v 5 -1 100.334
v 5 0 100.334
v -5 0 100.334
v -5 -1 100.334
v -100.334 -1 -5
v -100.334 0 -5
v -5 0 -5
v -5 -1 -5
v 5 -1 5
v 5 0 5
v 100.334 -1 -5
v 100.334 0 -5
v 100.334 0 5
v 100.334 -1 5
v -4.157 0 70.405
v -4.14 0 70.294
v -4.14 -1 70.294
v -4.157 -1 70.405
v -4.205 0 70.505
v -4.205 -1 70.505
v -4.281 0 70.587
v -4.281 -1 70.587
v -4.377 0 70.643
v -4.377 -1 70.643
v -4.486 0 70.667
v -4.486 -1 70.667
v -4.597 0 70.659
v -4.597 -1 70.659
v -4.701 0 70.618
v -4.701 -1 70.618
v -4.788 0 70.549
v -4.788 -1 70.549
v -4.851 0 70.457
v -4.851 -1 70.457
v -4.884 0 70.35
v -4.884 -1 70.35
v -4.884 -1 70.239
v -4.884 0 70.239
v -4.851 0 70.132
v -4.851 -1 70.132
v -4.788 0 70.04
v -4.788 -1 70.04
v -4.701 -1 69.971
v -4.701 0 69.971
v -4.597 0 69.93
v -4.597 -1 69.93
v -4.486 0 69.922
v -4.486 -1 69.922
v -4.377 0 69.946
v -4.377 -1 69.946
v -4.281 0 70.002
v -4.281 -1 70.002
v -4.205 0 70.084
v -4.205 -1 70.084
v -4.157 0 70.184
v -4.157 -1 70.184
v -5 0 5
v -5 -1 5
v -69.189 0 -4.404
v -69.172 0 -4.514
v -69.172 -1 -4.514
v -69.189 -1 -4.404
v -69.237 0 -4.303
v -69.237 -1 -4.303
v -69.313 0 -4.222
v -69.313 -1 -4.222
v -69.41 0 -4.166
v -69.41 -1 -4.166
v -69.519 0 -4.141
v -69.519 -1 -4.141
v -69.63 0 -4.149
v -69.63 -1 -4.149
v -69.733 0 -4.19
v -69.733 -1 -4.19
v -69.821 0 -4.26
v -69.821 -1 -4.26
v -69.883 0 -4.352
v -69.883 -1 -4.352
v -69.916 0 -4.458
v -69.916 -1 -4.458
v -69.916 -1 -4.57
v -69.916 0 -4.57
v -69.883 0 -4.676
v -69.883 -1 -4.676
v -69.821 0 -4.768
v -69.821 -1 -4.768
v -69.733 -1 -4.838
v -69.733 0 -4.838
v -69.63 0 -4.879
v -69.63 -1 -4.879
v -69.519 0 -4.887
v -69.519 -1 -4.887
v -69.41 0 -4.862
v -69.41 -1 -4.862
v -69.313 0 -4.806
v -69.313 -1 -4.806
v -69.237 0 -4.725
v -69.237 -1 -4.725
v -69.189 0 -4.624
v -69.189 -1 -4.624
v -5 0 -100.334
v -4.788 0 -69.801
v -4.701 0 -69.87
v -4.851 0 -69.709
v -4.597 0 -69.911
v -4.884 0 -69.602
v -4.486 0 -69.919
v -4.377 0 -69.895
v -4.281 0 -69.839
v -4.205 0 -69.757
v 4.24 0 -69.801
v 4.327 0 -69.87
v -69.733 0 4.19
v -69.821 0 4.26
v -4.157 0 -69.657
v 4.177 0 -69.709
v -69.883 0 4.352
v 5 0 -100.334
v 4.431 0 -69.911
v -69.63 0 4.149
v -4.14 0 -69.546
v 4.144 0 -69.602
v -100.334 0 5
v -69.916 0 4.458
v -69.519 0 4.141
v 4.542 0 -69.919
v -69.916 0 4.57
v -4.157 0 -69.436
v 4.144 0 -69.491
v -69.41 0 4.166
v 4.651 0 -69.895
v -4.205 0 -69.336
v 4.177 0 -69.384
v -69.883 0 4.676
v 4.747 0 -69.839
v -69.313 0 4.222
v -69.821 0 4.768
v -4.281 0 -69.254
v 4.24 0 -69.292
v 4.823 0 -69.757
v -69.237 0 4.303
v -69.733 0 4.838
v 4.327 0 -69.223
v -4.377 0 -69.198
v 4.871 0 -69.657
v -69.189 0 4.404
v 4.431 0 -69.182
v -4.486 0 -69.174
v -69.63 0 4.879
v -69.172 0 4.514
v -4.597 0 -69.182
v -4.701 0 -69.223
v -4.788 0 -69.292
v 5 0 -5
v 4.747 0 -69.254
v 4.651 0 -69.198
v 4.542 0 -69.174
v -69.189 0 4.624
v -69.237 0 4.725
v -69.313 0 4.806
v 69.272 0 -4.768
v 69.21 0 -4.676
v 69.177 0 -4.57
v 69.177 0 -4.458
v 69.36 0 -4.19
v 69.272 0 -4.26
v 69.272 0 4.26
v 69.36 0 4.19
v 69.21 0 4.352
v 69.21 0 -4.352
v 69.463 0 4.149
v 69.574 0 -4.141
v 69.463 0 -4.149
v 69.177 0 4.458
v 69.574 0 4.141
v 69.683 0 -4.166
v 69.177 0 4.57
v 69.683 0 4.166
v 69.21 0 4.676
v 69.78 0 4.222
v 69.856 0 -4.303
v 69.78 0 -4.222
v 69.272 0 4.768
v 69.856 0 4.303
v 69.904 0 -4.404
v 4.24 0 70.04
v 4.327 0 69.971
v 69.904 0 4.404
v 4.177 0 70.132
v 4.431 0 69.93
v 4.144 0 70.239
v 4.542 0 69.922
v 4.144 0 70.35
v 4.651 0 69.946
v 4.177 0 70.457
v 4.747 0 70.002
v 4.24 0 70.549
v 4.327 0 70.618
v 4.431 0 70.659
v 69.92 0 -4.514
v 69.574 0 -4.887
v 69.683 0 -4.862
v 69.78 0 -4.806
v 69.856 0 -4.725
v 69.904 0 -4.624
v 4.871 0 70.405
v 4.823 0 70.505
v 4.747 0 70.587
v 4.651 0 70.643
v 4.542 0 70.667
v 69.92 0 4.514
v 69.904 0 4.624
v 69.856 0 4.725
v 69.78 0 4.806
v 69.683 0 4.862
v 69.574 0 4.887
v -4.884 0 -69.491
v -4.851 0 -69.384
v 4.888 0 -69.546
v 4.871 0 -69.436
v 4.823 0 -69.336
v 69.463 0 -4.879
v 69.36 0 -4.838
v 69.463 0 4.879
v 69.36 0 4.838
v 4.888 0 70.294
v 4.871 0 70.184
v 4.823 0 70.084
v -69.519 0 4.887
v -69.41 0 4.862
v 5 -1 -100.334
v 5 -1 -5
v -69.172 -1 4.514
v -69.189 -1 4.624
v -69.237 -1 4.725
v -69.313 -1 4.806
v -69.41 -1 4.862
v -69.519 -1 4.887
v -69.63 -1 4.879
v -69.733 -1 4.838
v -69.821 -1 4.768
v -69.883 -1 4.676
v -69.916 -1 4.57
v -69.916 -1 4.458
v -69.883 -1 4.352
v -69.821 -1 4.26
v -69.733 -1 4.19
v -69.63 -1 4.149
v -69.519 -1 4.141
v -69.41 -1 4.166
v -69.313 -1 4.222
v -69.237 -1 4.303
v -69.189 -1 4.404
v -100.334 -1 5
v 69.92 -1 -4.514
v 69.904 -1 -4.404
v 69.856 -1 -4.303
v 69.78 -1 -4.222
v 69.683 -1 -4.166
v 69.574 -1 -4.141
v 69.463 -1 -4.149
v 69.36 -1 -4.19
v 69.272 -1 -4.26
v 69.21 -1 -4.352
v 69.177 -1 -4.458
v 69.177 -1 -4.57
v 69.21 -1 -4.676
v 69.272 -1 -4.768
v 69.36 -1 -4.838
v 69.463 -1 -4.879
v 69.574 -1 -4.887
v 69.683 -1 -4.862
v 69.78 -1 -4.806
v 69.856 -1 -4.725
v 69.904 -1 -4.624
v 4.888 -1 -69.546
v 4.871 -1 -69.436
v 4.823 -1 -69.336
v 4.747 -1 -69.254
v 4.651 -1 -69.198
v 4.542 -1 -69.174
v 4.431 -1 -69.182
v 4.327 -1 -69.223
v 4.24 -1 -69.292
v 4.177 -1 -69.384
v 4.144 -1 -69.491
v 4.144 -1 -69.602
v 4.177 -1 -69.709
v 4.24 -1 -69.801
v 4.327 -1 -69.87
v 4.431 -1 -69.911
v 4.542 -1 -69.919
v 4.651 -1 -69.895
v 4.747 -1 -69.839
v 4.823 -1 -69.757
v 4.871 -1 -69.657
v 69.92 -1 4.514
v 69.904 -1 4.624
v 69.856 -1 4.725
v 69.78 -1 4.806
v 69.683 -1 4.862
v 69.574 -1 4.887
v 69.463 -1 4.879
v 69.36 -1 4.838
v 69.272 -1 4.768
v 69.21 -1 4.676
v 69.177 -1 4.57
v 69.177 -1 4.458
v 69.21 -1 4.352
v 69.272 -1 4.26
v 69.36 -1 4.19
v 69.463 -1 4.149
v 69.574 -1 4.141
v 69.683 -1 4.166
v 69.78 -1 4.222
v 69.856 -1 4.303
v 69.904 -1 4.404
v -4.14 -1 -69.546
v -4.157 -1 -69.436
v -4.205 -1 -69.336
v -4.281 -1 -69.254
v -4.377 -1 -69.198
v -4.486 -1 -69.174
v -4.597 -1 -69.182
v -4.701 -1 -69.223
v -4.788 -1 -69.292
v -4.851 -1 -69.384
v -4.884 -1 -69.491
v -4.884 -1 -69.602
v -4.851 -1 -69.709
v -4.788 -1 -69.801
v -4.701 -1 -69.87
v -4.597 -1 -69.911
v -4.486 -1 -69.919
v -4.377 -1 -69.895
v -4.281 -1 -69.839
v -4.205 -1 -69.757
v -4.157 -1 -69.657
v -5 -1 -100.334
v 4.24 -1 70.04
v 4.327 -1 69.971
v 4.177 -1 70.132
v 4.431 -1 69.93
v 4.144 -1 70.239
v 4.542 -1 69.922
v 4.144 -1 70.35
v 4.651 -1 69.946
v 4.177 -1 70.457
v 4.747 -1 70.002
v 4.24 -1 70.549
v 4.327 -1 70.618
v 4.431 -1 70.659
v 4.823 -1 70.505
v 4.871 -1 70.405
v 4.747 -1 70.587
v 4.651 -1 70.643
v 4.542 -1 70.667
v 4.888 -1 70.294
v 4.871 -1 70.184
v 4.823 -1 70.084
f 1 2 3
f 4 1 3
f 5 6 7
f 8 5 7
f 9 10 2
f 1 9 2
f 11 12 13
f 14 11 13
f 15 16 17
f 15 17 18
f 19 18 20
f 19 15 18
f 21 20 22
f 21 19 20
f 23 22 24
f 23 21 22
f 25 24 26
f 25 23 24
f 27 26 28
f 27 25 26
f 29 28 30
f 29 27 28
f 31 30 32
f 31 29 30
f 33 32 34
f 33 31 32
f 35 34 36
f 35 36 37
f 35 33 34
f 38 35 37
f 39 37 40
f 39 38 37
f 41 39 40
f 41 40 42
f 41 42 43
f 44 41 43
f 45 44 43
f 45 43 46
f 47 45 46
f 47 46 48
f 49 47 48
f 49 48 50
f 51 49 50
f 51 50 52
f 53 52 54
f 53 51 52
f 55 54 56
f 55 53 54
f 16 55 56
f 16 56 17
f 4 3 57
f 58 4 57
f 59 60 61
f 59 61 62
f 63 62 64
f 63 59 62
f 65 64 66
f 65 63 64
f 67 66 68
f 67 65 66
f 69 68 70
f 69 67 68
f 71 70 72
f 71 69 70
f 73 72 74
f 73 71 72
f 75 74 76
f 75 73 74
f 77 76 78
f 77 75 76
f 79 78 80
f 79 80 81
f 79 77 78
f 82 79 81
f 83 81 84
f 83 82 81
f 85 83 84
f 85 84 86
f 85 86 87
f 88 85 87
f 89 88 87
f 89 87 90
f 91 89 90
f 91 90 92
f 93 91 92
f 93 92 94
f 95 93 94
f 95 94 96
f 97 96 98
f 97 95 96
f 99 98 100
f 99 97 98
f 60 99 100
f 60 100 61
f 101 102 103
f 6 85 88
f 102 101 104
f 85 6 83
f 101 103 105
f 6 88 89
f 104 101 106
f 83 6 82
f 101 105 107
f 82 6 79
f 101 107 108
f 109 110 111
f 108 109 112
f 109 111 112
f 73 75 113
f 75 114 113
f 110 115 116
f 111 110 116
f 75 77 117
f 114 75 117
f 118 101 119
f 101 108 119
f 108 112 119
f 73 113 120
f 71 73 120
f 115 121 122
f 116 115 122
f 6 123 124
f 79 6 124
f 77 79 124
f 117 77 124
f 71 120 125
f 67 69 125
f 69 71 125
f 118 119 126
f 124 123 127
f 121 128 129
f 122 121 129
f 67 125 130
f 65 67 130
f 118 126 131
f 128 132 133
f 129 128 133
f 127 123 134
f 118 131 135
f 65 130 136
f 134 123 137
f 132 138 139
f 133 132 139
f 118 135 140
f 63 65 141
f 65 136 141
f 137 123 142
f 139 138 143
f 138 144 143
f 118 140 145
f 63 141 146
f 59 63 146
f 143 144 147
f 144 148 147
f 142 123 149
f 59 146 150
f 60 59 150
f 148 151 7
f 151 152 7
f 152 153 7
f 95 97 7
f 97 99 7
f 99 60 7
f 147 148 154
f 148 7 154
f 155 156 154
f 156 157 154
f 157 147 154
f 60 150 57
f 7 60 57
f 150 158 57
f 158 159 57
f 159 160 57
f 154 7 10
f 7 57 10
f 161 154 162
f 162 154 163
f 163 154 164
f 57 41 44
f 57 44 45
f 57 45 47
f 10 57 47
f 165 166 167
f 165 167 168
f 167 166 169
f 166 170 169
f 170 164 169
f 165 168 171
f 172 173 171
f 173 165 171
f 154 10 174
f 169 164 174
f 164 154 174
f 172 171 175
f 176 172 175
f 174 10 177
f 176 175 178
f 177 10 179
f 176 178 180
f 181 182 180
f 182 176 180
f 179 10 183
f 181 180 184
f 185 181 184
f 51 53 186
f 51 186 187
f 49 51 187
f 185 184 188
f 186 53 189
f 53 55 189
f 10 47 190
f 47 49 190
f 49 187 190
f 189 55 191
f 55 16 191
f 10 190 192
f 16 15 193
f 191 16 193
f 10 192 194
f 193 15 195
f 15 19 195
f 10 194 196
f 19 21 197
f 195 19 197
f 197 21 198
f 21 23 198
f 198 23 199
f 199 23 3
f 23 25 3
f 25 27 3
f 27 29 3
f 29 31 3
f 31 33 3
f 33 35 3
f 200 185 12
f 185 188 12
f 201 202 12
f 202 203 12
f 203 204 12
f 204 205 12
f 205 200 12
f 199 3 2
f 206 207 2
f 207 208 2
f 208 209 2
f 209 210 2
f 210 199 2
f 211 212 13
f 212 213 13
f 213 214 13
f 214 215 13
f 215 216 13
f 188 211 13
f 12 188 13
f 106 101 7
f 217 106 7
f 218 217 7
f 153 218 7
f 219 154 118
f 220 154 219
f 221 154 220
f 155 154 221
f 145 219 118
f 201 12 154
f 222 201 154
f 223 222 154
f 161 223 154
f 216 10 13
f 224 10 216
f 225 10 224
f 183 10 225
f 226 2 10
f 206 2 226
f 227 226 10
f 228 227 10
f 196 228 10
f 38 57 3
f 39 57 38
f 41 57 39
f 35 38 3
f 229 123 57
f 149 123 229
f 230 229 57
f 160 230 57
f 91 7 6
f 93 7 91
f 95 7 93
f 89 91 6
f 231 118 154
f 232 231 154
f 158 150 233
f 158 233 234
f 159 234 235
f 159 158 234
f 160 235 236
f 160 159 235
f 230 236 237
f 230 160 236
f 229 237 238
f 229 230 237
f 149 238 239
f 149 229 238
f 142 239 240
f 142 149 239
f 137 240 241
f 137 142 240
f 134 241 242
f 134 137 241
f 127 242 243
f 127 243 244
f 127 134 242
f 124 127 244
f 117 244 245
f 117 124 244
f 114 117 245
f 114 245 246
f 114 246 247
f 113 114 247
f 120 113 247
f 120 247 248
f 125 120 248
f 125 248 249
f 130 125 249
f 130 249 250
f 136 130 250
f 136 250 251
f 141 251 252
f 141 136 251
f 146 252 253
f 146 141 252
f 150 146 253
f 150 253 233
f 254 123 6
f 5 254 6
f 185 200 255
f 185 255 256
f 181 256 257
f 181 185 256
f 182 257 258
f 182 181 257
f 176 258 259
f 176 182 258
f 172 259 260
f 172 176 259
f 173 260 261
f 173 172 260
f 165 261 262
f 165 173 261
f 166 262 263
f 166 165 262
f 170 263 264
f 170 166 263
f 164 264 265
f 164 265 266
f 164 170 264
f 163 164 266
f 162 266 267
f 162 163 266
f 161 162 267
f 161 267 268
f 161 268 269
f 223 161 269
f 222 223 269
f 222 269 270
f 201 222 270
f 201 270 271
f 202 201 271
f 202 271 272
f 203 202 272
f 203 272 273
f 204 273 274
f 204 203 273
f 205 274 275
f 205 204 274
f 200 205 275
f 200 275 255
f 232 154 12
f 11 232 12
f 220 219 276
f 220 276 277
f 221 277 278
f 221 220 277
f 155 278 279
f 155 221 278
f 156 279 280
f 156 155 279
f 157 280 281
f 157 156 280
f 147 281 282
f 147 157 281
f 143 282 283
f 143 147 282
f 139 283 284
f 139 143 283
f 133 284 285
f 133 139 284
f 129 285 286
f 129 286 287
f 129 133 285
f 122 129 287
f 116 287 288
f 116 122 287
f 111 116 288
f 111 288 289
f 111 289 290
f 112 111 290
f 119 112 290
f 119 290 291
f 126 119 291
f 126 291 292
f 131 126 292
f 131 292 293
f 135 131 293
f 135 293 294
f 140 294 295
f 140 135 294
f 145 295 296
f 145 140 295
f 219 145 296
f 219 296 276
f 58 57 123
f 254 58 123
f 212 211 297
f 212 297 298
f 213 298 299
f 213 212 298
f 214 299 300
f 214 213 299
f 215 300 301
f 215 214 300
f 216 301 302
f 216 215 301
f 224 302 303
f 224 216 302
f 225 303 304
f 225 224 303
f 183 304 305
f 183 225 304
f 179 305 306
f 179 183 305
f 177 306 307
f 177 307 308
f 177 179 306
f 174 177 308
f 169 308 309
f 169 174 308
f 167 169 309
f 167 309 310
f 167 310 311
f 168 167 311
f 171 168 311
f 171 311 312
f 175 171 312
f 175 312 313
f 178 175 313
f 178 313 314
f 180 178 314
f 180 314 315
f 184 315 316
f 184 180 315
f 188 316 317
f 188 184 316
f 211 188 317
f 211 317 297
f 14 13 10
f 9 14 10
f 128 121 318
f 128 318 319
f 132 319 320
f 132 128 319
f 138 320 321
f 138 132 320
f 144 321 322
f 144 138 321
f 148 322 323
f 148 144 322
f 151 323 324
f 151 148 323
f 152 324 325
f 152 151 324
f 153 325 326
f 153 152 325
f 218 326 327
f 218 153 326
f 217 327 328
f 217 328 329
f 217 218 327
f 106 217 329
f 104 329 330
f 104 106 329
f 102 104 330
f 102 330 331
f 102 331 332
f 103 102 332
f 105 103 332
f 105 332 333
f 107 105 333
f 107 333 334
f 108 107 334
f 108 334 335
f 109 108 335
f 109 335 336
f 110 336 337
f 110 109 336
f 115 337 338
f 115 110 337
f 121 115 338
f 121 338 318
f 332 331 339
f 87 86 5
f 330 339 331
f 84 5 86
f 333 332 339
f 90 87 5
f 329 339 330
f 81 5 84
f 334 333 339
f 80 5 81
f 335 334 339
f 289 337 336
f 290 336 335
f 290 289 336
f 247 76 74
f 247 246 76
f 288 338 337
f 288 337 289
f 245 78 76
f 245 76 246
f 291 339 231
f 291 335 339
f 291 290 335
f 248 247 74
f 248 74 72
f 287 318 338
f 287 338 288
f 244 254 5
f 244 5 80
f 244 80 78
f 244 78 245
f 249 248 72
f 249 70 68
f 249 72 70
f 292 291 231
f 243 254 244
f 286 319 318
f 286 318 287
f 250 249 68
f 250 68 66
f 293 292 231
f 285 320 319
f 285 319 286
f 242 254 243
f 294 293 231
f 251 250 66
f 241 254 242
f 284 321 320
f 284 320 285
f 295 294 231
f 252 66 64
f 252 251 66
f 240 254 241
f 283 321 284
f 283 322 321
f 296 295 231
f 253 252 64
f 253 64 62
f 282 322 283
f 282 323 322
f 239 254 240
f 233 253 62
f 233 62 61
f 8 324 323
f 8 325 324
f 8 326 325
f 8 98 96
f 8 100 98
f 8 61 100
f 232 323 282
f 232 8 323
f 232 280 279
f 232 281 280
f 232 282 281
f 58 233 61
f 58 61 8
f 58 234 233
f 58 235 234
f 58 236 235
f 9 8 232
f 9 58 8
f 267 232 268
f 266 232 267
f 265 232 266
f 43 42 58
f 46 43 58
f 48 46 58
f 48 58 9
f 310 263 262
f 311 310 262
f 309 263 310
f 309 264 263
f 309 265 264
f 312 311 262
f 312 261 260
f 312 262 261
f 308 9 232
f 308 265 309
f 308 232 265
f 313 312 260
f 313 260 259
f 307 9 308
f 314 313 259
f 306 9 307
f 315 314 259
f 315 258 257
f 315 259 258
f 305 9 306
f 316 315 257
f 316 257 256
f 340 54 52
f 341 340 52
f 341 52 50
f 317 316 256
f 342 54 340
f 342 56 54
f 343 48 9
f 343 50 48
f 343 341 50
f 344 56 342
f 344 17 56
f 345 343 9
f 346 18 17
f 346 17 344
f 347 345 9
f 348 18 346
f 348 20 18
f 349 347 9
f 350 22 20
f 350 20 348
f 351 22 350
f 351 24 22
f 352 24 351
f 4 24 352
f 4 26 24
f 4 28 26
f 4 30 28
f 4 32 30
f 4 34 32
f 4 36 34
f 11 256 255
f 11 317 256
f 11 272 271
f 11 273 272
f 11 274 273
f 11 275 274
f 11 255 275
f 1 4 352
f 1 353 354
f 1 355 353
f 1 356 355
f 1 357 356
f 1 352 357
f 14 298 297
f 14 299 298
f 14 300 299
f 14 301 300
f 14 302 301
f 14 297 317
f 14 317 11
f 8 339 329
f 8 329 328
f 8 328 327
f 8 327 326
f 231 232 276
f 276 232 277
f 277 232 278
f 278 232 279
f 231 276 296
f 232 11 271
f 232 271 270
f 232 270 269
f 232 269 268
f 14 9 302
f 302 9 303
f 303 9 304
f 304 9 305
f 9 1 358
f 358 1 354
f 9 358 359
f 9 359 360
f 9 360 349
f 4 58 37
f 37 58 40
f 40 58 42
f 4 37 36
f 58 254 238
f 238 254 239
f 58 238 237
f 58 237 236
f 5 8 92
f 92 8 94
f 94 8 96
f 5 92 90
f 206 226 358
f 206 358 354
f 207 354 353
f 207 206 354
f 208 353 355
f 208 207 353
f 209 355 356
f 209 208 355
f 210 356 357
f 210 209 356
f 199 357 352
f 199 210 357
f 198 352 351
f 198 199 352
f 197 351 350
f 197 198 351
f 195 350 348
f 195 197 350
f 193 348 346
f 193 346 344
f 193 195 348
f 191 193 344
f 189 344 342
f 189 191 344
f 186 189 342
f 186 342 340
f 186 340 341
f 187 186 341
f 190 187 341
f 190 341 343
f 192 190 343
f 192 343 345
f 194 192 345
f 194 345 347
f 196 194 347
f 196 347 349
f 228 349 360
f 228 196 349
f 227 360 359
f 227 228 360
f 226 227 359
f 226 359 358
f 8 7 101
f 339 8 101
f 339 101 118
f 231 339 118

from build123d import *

# Parameters (mm, degrees)
F0_R     = 0.374
F1_DEPTH = 1


with BuildPart() as f1:
    # F0 (on Front) → F1 (new body)
    with BuildSketch(Plane.XZ):
        Polygon((-5, -5), (-5, -100.3335), (5, -100.3335), (5, -5), (100.3335, -5), (100.3335, 5), (5, 5), (5, 100.3335), (-5, 100.3335), (-5, 5), (-100.3335, 5), (-100.3335, -5), align=None)
        with Locations((-4.514, -69.5465)):
            Circle(F0_R, mode=Mode.SUBTRACT)
        with Locations((-69.5465, -4.514)):
            Circle(F0_R, mode=Mode.SUBTRACT)
        with Locations((4.514, -69.5465)):
            Circle(F0_R, mode=Mode.SUBTRACT)
        with Locations((69.5465, -4.514)):
            Circle(F0_R, mode=Mode.SUBTRACT)
        with Locations((-69.5465, 4.514)):
            Circle(F0_R, mode=Mode.SUBTRACT)
        with Locations((-4.514, 70.2945)):
            Circle(F0_R, mode=Mode.SUBTRACT)
        with Locations((69.5465, 4.514)):
            Circle(F0_R, mode=Mode.SUBTRACT)
        with Locations((4.514, 70.2945)):
            Circle(F0_R, mode=Mode.SUBTRACT)
    extrude(amount=F1_DEPTH)


solid = f1.part
